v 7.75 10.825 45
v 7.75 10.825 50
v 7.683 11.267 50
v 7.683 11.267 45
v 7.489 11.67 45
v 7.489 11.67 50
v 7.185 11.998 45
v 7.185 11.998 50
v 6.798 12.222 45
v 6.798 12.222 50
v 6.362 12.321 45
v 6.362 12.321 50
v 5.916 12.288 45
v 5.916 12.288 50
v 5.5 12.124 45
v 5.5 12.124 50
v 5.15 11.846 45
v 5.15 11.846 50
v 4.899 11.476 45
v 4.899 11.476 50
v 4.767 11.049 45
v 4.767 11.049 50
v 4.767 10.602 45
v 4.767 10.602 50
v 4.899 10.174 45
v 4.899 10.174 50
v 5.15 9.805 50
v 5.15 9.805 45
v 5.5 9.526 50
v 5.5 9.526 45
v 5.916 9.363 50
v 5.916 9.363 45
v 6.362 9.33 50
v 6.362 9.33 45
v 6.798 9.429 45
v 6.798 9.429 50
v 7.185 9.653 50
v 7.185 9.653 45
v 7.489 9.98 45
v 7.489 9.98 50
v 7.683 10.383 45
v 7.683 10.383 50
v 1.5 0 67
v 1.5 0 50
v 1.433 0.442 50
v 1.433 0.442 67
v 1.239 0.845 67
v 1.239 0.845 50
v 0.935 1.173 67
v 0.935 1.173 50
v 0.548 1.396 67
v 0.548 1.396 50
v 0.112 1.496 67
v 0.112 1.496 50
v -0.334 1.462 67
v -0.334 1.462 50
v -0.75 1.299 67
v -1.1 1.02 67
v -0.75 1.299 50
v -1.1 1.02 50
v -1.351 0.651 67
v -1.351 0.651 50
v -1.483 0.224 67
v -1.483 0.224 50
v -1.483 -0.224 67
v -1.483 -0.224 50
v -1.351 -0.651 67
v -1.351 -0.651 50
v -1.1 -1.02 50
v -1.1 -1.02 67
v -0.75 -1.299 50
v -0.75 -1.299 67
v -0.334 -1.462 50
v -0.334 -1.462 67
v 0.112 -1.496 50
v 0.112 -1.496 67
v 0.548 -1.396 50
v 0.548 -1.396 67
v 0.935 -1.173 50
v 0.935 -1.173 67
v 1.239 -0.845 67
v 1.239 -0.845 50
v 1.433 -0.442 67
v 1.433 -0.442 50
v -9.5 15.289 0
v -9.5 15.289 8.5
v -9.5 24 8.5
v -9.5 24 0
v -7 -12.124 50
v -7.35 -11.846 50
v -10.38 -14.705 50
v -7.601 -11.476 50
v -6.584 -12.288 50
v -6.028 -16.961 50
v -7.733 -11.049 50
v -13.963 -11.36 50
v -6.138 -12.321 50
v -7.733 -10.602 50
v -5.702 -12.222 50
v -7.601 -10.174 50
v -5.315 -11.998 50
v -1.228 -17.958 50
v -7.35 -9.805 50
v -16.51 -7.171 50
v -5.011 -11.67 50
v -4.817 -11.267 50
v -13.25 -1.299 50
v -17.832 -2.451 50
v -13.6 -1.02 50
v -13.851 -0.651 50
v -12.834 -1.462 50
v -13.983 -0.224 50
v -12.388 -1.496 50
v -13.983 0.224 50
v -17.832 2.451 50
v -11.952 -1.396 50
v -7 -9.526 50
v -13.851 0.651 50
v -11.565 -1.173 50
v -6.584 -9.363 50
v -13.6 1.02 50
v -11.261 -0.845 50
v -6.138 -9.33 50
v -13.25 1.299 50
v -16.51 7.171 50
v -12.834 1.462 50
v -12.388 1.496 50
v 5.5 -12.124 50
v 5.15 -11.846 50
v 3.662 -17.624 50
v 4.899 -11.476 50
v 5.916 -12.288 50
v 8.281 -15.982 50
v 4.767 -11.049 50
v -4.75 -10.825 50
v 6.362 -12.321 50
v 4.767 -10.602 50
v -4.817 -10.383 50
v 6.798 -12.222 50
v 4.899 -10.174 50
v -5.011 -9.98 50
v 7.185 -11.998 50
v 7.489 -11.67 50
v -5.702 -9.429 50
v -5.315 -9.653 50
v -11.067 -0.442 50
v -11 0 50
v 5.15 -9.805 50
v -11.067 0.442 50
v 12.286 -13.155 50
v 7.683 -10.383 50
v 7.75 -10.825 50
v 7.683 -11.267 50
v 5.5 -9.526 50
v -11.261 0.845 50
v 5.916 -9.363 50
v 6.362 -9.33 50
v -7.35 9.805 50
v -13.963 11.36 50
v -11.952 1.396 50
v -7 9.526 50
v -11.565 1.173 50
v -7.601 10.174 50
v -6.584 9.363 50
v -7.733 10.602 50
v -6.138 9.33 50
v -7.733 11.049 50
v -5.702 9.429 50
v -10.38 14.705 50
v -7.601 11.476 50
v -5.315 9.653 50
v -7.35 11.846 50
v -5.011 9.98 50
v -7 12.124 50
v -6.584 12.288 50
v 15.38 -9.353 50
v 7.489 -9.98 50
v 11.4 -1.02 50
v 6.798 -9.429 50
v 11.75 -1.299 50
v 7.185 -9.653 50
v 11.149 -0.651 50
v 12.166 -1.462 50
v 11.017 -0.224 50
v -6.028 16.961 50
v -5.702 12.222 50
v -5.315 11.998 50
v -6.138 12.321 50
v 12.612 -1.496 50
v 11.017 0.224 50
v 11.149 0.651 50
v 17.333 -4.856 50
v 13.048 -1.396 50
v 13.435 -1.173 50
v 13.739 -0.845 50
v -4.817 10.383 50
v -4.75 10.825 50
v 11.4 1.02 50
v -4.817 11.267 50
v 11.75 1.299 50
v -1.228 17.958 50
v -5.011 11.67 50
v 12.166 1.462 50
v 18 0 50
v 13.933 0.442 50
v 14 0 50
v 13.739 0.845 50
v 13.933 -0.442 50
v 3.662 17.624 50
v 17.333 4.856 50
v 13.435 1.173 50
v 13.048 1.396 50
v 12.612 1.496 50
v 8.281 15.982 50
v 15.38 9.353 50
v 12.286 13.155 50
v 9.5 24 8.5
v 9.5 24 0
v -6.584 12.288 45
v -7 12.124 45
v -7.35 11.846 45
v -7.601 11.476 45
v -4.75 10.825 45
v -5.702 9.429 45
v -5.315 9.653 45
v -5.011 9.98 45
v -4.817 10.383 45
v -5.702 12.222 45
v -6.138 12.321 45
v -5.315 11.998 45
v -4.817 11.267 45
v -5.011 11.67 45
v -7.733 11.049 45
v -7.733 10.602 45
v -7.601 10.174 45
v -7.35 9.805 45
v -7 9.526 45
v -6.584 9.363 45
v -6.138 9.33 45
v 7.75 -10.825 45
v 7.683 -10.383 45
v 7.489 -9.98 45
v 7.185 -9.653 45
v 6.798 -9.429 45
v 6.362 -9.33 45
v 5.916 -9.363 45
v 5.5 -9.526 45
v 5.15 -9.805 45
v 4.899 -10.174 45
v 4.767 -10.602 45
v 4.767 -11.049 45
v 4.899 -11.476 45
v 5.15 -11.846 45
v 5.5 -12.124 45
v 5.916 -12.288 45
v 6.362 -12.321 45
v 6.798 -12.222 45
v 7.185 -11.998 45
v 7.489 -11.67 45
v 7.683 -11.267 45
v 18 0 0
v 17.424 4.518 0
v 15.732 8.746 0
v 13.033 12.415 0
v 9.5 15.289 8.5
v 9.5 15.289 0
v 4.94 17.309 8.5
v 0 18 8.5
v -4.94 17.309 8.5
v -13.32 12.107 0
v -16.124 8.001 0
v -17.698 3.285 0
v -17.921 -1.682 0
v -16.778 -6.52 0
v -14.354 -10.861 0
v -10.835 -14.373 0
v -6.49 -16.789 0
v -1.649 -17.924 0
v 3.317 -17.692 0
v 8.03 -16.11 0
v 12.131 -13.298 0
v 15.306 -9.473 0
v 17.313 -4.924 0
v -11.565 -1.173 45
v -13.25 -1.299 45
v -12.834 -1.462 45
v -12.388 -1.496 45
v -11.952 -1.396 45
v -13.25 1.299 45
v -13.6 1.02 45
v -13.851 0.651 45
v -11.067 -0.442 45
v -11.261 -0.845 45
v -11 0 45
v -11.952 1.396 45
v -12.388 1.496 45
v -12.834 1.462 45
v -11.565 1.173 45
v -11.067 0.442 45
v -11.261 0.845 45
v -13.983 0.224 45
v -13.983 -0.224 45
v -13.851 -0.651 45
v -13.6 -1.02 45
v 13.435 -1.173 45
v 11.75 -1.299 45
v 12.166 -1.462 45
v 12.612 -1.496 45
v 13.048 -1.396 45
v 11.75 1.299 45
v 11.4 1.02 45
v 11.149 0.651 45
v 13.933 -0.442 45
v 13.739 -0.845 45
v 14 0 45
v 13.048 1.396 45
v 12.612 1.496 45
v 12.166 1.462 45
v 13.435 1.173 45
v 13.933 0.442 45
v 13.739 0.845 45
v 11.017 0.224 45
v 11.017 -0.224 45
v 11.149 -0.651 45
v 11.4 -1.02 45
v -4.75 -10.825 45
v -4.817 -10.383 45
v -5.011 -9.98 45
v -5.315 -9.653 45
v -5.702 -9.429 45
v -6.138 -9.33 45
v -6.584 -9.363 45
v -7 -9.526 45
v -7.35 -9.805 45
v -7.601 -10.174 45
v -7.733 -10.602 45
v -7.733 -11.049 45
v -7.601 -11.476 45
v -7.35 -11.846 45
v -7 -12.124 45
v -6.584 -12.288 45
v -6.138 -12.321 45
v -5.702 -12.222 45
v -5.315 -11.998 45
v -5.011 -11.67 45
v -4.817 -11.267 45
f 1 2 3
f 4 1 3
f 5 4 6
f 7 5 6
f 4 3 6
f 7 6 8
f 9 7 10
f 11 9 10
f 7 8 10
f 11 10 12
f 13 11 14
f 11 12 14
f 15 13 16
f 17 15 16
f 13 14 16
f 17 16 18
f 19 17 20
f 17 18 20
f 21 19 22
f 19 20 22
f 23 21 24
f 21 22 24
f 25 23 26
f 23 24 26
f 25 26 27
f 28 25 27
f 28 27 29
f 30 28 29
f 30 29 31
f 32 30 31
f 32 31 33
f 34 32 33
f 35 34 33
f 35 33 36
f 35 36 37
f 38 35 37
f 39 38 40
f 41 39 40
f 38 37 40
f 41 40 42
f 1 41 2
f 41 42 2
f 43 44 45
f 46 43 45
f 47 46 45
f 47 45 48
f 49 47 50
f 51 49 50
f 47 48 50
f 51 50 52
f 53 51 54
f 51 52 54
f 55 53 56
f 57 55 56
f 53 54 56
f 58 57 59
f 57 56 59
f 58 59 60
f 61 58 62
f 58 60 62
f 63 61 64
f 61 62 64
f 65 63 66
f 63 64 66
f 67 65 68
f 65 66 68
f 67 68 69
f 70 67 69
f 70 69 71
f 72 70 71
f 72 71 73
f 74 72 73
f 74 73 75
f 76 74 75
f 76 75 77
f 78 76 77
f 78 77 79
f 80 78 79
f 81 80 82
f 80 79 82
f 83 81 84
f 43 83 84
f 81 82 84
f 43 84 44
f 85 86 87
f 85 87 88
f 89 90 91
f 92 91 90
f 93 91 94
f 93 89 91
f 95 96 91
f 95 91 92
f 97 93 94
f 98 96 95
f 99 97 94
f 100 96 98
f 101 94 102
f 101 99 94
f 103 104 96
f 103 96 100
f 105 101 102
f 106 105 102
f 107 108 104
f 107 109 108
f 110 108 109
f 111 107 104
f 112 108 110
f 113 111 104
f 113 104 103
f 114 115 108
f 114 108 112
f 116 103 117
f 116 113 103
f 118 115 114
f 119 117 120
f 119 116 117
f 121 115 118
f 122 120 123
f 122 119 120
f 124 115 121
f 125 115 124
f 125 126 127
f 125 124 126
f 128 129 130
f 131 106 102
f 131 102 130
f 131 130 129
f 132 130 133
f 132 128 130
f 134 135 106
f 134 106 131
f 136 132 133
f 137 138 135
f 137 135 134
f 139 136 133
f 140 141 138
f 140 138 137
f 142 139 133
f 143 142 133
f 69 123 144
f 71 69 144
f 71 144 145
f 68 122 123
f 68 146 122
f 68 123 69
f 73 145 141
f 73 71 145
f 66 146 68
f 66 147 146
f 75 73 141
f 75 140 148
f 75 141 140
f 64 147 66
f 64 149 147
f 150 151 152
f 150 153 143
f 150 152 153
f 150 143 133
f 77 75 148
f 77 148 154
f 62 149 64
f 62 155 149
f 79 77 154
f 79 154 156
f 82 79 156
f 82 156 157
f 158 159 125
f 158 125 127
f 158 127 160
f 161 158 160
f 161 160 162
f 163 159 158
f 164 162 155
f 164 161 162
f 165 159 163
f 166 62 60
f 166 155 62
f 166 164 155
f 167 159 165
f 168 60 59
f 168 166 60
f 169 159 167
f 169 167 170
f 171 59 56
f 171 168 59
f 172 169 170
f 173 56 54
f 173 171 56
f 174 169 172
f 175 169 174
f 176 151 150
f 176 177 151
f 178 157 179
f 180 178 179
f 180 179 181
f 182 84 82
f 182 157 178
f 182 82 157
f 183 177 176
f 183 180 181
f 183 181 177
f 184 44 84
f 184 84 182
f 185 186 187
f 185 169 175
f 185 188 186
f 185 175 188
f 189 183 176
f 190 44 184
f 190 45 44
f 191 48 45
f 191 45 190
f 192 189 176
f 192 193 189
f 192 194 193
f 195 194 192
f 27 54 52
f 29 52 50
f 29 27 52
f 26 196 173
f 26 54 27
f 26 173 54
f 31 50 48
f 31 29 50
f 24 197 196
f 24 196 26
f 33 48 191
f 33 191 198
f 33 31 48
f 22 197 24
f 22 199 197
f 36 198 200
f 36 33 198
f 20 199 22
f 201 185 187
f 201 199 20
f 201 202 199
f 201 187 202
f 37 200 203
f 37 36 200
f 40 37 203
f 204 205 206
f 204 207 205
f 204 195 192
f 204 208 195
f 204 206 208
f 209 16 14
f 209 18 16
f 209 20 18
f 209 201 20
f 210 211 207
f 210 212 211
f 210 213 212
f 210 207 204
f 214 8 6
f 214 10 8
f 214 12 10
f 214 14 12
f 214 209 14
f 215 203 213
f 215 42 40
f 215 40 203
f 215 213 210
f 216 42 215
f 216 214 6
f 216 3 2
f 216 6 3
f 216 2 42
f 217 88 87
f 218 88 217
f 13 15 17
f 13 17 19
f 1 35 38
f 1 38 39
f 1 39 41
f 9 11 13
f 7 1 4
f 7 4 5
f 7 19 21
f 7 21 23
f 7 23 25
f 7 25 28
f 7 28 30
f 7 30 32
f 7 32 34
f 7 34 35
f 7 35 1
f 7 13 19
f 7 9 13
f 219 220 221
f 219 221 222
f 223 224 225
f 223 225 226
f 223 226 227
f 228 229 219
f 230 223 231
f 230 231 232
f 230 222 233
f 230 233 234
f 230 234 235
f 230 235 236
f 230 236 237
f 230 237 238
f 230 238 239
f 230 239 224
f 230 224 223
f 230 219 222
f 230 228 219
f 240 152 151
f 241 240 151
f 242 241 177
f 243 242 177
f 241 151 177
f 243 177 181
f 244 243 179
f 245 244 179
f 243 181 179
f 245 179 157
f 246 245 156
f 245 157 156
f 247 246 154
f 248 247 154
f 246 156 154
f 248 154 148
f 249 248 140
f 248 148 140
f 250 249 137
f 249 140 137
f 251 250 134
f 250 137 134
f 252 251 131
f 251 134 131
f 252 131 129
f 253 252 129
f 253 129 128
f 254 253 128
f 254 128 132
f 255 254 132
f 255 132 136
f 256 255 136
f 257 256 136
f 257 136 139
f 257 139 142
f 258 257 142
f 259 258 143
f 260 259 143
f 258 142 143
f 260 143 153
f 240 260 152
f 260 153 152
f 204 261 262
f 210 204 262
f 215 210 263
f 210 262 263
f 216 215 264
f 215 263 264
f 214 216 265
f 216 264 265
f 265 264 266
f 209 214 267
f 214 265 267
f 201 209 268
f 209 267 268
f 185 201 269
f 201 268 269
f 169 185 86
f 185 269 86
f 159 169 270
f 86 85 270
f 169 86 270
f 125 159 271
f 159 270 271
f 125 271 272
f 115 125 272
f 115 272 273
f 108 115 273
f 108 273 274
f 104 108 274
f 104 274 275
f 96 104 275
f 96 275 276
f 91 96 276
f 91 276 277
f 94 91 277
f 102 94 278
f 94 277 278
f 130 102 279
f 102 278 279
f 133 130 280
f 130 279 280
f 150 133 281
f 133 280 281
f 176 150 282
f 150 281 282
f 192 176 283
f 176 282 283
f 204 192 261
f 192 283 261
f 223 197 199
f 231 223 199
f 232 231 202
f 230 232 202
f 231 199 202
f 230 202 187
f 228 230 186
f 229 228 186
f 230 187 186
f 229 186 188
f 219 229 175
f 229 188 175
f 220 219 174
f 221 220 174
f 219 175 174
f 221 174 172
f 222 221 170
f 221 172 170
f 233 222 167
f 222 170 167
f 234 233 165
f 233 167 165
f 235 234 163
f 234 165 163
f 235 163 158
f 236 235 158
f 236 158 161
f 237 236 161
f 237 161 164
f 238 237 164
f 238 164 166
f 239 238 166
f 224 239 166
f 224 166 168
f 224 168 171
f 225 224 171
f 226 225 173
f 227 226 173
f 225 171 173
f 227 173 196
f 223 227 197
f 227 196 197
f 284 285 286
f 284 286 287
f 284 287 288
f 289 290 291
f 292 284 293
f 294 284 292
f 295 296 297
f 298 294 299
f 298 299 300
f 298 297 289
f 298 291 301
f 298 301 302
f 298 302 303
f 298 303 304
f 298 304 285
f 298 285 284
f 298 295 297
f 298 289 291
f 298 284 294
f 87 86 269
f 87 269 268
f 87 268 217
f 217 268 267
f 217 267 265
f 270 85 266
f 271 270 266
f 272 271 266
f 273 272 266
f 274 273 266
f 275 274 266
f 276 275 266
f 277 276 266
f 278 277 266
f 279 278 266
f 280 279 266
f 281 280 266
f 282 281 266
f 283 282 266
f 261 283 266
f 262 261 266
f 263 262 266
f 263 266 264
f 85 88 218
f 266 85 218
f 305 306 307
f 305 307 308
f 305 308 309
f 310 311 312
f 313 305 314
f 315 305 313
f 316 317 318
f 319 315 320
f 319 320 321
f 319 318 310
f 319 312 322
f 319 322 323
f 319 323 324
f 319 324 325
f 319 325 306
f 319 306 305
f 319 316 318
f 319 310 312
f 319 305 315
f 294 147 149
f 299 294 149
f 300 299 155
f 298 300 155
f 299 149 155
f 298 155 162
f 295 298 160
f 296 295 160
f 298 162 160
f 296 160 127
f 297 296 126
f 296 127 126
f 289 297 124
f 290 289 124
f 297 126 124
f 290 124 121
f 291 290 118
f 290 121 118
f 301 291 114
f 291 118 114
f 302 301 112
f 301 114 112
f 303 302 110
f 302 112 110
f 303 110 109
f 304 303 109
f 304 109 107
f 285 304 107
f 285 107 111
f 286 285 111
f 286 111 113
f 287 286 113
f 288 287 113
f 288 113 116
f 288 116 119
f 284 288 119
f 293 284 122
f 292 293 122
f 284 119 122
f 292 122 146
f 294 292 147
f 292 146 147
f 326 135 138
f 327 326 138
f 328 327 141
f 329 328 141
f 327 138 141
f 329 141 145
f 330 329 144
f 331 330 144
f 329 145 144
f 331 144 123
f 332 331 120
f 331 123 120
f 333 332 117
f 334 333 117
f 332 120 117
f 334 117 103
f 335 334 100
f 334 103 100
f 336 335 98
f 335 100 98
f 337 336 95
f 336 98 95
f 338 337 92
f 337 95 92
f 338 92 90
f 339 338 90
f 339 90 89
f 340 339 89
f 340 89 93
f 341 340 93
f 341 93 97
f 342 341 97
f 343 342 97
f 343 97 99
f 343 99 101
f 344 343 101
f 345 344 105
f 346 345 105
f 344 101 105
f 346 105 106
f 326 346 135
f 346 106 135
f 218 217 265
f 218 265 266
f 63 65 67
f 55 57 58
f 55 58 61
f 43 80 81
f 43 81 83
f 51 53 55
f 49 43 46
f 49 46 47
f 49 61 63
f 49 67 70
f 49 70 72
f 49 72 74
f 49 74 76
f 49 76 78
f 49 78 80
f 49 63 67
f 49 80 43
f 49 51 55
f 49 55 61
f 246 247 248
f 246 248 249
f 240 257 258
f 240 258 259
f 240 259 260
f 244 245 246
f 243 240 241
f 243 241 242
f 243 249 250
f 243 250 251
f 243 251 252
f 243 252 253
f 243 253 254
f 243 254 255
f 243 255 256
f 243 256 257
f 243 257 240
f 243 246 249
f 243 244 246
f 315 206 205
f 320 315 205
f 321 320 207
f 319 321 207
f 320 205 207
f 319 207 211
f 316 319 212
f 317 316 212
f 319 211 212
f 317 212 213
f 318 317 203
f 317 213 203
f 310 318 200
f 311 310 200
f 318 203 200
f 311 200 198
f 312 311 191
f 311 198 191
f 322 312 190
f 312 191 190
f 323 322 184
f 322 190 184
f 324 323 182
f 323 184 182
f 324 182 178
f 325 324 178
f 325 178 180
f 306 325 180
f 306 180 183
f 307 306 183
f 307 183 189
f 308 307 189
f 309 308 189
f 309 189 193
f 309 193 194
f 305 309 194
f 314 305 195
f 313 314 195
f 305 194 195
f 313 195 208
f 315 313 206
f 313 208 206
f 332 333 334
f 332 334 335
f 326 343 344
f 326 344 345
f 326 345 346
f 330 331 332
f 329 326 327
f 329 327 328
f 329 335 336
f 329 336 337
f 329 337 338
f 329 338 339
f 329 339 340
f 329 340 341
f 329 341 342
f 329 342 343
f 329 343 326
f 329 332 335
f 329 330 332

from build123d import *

# Parameters (mm, degrees)
SKETCH1_R           = 18
BOSS_EXTRUDE1_DEPTH = 50
SKETCH2_R           = 1.5
BOSS_EXTRUDE2_DEPTH = 17
SKETCH3_W           = 19
SKETCH3_H           = 8.5
BOSS_EXTRUDE3_DEPTH = 24
SKETCH4_R           = 1.5
CUT_EXTRUDE1_DEPTH  = 5


with BuildPart() as part:
    # Sketch1 → Boss-Extrude1 (new body)
    with BuildSketch(Plane.XY):
        Circle(SKETCH1_R)
    extrude(amount=BOSS_EXTRUDE1_DEPTH)

    # Sketch2 → Boss-Extrude2 (add)
    with BuildSketch(Plane.XY.offset(50)):
        Circle(SKETCH2_R)
    extrude(amount=BOSS_EXTRUDE2_DEPTH)

    # Sketch3 → Boss-Extrude3 (add)
    with BuildSketch(Plane(origin=(0, 0, 0), x_dir=(1, 0, 0), z_dir=(0, 1, 0))):
        with Locations((0, -4.25)):
            Rectangle(SKETCH3_W, SKETCH3_H)
    extrude(amount=BOSS_EXTRUDE3_DEPTH)

    # Sketch4 → Cut-Extrude1 (cut)
    with BuildSketch(Plane.XY.offset(50)):
        with Locations((12.5, 0)):
            Circle(SKETCH4_R)
        with Locations((6.25, -10.825317547)):
            Circle(SKETCH4_R)
        with Locations((-6.25, -10.825317547)):
            Circle(SKETCH4_R)
        with Locations((-12.5, 0)):
            Circle(SKETCH4_R)
        with Locations((-6.25, 10.825317547)):
            Circle(SKETCH4_R)
        with Locations((6.25, 10.825317547)):
            Circle(SKETCH4_R)
    extrude(amount=-CUT_EXTRUDE1_DEPTH, mode=Mode.SUBTRACT)


solid = part.part
